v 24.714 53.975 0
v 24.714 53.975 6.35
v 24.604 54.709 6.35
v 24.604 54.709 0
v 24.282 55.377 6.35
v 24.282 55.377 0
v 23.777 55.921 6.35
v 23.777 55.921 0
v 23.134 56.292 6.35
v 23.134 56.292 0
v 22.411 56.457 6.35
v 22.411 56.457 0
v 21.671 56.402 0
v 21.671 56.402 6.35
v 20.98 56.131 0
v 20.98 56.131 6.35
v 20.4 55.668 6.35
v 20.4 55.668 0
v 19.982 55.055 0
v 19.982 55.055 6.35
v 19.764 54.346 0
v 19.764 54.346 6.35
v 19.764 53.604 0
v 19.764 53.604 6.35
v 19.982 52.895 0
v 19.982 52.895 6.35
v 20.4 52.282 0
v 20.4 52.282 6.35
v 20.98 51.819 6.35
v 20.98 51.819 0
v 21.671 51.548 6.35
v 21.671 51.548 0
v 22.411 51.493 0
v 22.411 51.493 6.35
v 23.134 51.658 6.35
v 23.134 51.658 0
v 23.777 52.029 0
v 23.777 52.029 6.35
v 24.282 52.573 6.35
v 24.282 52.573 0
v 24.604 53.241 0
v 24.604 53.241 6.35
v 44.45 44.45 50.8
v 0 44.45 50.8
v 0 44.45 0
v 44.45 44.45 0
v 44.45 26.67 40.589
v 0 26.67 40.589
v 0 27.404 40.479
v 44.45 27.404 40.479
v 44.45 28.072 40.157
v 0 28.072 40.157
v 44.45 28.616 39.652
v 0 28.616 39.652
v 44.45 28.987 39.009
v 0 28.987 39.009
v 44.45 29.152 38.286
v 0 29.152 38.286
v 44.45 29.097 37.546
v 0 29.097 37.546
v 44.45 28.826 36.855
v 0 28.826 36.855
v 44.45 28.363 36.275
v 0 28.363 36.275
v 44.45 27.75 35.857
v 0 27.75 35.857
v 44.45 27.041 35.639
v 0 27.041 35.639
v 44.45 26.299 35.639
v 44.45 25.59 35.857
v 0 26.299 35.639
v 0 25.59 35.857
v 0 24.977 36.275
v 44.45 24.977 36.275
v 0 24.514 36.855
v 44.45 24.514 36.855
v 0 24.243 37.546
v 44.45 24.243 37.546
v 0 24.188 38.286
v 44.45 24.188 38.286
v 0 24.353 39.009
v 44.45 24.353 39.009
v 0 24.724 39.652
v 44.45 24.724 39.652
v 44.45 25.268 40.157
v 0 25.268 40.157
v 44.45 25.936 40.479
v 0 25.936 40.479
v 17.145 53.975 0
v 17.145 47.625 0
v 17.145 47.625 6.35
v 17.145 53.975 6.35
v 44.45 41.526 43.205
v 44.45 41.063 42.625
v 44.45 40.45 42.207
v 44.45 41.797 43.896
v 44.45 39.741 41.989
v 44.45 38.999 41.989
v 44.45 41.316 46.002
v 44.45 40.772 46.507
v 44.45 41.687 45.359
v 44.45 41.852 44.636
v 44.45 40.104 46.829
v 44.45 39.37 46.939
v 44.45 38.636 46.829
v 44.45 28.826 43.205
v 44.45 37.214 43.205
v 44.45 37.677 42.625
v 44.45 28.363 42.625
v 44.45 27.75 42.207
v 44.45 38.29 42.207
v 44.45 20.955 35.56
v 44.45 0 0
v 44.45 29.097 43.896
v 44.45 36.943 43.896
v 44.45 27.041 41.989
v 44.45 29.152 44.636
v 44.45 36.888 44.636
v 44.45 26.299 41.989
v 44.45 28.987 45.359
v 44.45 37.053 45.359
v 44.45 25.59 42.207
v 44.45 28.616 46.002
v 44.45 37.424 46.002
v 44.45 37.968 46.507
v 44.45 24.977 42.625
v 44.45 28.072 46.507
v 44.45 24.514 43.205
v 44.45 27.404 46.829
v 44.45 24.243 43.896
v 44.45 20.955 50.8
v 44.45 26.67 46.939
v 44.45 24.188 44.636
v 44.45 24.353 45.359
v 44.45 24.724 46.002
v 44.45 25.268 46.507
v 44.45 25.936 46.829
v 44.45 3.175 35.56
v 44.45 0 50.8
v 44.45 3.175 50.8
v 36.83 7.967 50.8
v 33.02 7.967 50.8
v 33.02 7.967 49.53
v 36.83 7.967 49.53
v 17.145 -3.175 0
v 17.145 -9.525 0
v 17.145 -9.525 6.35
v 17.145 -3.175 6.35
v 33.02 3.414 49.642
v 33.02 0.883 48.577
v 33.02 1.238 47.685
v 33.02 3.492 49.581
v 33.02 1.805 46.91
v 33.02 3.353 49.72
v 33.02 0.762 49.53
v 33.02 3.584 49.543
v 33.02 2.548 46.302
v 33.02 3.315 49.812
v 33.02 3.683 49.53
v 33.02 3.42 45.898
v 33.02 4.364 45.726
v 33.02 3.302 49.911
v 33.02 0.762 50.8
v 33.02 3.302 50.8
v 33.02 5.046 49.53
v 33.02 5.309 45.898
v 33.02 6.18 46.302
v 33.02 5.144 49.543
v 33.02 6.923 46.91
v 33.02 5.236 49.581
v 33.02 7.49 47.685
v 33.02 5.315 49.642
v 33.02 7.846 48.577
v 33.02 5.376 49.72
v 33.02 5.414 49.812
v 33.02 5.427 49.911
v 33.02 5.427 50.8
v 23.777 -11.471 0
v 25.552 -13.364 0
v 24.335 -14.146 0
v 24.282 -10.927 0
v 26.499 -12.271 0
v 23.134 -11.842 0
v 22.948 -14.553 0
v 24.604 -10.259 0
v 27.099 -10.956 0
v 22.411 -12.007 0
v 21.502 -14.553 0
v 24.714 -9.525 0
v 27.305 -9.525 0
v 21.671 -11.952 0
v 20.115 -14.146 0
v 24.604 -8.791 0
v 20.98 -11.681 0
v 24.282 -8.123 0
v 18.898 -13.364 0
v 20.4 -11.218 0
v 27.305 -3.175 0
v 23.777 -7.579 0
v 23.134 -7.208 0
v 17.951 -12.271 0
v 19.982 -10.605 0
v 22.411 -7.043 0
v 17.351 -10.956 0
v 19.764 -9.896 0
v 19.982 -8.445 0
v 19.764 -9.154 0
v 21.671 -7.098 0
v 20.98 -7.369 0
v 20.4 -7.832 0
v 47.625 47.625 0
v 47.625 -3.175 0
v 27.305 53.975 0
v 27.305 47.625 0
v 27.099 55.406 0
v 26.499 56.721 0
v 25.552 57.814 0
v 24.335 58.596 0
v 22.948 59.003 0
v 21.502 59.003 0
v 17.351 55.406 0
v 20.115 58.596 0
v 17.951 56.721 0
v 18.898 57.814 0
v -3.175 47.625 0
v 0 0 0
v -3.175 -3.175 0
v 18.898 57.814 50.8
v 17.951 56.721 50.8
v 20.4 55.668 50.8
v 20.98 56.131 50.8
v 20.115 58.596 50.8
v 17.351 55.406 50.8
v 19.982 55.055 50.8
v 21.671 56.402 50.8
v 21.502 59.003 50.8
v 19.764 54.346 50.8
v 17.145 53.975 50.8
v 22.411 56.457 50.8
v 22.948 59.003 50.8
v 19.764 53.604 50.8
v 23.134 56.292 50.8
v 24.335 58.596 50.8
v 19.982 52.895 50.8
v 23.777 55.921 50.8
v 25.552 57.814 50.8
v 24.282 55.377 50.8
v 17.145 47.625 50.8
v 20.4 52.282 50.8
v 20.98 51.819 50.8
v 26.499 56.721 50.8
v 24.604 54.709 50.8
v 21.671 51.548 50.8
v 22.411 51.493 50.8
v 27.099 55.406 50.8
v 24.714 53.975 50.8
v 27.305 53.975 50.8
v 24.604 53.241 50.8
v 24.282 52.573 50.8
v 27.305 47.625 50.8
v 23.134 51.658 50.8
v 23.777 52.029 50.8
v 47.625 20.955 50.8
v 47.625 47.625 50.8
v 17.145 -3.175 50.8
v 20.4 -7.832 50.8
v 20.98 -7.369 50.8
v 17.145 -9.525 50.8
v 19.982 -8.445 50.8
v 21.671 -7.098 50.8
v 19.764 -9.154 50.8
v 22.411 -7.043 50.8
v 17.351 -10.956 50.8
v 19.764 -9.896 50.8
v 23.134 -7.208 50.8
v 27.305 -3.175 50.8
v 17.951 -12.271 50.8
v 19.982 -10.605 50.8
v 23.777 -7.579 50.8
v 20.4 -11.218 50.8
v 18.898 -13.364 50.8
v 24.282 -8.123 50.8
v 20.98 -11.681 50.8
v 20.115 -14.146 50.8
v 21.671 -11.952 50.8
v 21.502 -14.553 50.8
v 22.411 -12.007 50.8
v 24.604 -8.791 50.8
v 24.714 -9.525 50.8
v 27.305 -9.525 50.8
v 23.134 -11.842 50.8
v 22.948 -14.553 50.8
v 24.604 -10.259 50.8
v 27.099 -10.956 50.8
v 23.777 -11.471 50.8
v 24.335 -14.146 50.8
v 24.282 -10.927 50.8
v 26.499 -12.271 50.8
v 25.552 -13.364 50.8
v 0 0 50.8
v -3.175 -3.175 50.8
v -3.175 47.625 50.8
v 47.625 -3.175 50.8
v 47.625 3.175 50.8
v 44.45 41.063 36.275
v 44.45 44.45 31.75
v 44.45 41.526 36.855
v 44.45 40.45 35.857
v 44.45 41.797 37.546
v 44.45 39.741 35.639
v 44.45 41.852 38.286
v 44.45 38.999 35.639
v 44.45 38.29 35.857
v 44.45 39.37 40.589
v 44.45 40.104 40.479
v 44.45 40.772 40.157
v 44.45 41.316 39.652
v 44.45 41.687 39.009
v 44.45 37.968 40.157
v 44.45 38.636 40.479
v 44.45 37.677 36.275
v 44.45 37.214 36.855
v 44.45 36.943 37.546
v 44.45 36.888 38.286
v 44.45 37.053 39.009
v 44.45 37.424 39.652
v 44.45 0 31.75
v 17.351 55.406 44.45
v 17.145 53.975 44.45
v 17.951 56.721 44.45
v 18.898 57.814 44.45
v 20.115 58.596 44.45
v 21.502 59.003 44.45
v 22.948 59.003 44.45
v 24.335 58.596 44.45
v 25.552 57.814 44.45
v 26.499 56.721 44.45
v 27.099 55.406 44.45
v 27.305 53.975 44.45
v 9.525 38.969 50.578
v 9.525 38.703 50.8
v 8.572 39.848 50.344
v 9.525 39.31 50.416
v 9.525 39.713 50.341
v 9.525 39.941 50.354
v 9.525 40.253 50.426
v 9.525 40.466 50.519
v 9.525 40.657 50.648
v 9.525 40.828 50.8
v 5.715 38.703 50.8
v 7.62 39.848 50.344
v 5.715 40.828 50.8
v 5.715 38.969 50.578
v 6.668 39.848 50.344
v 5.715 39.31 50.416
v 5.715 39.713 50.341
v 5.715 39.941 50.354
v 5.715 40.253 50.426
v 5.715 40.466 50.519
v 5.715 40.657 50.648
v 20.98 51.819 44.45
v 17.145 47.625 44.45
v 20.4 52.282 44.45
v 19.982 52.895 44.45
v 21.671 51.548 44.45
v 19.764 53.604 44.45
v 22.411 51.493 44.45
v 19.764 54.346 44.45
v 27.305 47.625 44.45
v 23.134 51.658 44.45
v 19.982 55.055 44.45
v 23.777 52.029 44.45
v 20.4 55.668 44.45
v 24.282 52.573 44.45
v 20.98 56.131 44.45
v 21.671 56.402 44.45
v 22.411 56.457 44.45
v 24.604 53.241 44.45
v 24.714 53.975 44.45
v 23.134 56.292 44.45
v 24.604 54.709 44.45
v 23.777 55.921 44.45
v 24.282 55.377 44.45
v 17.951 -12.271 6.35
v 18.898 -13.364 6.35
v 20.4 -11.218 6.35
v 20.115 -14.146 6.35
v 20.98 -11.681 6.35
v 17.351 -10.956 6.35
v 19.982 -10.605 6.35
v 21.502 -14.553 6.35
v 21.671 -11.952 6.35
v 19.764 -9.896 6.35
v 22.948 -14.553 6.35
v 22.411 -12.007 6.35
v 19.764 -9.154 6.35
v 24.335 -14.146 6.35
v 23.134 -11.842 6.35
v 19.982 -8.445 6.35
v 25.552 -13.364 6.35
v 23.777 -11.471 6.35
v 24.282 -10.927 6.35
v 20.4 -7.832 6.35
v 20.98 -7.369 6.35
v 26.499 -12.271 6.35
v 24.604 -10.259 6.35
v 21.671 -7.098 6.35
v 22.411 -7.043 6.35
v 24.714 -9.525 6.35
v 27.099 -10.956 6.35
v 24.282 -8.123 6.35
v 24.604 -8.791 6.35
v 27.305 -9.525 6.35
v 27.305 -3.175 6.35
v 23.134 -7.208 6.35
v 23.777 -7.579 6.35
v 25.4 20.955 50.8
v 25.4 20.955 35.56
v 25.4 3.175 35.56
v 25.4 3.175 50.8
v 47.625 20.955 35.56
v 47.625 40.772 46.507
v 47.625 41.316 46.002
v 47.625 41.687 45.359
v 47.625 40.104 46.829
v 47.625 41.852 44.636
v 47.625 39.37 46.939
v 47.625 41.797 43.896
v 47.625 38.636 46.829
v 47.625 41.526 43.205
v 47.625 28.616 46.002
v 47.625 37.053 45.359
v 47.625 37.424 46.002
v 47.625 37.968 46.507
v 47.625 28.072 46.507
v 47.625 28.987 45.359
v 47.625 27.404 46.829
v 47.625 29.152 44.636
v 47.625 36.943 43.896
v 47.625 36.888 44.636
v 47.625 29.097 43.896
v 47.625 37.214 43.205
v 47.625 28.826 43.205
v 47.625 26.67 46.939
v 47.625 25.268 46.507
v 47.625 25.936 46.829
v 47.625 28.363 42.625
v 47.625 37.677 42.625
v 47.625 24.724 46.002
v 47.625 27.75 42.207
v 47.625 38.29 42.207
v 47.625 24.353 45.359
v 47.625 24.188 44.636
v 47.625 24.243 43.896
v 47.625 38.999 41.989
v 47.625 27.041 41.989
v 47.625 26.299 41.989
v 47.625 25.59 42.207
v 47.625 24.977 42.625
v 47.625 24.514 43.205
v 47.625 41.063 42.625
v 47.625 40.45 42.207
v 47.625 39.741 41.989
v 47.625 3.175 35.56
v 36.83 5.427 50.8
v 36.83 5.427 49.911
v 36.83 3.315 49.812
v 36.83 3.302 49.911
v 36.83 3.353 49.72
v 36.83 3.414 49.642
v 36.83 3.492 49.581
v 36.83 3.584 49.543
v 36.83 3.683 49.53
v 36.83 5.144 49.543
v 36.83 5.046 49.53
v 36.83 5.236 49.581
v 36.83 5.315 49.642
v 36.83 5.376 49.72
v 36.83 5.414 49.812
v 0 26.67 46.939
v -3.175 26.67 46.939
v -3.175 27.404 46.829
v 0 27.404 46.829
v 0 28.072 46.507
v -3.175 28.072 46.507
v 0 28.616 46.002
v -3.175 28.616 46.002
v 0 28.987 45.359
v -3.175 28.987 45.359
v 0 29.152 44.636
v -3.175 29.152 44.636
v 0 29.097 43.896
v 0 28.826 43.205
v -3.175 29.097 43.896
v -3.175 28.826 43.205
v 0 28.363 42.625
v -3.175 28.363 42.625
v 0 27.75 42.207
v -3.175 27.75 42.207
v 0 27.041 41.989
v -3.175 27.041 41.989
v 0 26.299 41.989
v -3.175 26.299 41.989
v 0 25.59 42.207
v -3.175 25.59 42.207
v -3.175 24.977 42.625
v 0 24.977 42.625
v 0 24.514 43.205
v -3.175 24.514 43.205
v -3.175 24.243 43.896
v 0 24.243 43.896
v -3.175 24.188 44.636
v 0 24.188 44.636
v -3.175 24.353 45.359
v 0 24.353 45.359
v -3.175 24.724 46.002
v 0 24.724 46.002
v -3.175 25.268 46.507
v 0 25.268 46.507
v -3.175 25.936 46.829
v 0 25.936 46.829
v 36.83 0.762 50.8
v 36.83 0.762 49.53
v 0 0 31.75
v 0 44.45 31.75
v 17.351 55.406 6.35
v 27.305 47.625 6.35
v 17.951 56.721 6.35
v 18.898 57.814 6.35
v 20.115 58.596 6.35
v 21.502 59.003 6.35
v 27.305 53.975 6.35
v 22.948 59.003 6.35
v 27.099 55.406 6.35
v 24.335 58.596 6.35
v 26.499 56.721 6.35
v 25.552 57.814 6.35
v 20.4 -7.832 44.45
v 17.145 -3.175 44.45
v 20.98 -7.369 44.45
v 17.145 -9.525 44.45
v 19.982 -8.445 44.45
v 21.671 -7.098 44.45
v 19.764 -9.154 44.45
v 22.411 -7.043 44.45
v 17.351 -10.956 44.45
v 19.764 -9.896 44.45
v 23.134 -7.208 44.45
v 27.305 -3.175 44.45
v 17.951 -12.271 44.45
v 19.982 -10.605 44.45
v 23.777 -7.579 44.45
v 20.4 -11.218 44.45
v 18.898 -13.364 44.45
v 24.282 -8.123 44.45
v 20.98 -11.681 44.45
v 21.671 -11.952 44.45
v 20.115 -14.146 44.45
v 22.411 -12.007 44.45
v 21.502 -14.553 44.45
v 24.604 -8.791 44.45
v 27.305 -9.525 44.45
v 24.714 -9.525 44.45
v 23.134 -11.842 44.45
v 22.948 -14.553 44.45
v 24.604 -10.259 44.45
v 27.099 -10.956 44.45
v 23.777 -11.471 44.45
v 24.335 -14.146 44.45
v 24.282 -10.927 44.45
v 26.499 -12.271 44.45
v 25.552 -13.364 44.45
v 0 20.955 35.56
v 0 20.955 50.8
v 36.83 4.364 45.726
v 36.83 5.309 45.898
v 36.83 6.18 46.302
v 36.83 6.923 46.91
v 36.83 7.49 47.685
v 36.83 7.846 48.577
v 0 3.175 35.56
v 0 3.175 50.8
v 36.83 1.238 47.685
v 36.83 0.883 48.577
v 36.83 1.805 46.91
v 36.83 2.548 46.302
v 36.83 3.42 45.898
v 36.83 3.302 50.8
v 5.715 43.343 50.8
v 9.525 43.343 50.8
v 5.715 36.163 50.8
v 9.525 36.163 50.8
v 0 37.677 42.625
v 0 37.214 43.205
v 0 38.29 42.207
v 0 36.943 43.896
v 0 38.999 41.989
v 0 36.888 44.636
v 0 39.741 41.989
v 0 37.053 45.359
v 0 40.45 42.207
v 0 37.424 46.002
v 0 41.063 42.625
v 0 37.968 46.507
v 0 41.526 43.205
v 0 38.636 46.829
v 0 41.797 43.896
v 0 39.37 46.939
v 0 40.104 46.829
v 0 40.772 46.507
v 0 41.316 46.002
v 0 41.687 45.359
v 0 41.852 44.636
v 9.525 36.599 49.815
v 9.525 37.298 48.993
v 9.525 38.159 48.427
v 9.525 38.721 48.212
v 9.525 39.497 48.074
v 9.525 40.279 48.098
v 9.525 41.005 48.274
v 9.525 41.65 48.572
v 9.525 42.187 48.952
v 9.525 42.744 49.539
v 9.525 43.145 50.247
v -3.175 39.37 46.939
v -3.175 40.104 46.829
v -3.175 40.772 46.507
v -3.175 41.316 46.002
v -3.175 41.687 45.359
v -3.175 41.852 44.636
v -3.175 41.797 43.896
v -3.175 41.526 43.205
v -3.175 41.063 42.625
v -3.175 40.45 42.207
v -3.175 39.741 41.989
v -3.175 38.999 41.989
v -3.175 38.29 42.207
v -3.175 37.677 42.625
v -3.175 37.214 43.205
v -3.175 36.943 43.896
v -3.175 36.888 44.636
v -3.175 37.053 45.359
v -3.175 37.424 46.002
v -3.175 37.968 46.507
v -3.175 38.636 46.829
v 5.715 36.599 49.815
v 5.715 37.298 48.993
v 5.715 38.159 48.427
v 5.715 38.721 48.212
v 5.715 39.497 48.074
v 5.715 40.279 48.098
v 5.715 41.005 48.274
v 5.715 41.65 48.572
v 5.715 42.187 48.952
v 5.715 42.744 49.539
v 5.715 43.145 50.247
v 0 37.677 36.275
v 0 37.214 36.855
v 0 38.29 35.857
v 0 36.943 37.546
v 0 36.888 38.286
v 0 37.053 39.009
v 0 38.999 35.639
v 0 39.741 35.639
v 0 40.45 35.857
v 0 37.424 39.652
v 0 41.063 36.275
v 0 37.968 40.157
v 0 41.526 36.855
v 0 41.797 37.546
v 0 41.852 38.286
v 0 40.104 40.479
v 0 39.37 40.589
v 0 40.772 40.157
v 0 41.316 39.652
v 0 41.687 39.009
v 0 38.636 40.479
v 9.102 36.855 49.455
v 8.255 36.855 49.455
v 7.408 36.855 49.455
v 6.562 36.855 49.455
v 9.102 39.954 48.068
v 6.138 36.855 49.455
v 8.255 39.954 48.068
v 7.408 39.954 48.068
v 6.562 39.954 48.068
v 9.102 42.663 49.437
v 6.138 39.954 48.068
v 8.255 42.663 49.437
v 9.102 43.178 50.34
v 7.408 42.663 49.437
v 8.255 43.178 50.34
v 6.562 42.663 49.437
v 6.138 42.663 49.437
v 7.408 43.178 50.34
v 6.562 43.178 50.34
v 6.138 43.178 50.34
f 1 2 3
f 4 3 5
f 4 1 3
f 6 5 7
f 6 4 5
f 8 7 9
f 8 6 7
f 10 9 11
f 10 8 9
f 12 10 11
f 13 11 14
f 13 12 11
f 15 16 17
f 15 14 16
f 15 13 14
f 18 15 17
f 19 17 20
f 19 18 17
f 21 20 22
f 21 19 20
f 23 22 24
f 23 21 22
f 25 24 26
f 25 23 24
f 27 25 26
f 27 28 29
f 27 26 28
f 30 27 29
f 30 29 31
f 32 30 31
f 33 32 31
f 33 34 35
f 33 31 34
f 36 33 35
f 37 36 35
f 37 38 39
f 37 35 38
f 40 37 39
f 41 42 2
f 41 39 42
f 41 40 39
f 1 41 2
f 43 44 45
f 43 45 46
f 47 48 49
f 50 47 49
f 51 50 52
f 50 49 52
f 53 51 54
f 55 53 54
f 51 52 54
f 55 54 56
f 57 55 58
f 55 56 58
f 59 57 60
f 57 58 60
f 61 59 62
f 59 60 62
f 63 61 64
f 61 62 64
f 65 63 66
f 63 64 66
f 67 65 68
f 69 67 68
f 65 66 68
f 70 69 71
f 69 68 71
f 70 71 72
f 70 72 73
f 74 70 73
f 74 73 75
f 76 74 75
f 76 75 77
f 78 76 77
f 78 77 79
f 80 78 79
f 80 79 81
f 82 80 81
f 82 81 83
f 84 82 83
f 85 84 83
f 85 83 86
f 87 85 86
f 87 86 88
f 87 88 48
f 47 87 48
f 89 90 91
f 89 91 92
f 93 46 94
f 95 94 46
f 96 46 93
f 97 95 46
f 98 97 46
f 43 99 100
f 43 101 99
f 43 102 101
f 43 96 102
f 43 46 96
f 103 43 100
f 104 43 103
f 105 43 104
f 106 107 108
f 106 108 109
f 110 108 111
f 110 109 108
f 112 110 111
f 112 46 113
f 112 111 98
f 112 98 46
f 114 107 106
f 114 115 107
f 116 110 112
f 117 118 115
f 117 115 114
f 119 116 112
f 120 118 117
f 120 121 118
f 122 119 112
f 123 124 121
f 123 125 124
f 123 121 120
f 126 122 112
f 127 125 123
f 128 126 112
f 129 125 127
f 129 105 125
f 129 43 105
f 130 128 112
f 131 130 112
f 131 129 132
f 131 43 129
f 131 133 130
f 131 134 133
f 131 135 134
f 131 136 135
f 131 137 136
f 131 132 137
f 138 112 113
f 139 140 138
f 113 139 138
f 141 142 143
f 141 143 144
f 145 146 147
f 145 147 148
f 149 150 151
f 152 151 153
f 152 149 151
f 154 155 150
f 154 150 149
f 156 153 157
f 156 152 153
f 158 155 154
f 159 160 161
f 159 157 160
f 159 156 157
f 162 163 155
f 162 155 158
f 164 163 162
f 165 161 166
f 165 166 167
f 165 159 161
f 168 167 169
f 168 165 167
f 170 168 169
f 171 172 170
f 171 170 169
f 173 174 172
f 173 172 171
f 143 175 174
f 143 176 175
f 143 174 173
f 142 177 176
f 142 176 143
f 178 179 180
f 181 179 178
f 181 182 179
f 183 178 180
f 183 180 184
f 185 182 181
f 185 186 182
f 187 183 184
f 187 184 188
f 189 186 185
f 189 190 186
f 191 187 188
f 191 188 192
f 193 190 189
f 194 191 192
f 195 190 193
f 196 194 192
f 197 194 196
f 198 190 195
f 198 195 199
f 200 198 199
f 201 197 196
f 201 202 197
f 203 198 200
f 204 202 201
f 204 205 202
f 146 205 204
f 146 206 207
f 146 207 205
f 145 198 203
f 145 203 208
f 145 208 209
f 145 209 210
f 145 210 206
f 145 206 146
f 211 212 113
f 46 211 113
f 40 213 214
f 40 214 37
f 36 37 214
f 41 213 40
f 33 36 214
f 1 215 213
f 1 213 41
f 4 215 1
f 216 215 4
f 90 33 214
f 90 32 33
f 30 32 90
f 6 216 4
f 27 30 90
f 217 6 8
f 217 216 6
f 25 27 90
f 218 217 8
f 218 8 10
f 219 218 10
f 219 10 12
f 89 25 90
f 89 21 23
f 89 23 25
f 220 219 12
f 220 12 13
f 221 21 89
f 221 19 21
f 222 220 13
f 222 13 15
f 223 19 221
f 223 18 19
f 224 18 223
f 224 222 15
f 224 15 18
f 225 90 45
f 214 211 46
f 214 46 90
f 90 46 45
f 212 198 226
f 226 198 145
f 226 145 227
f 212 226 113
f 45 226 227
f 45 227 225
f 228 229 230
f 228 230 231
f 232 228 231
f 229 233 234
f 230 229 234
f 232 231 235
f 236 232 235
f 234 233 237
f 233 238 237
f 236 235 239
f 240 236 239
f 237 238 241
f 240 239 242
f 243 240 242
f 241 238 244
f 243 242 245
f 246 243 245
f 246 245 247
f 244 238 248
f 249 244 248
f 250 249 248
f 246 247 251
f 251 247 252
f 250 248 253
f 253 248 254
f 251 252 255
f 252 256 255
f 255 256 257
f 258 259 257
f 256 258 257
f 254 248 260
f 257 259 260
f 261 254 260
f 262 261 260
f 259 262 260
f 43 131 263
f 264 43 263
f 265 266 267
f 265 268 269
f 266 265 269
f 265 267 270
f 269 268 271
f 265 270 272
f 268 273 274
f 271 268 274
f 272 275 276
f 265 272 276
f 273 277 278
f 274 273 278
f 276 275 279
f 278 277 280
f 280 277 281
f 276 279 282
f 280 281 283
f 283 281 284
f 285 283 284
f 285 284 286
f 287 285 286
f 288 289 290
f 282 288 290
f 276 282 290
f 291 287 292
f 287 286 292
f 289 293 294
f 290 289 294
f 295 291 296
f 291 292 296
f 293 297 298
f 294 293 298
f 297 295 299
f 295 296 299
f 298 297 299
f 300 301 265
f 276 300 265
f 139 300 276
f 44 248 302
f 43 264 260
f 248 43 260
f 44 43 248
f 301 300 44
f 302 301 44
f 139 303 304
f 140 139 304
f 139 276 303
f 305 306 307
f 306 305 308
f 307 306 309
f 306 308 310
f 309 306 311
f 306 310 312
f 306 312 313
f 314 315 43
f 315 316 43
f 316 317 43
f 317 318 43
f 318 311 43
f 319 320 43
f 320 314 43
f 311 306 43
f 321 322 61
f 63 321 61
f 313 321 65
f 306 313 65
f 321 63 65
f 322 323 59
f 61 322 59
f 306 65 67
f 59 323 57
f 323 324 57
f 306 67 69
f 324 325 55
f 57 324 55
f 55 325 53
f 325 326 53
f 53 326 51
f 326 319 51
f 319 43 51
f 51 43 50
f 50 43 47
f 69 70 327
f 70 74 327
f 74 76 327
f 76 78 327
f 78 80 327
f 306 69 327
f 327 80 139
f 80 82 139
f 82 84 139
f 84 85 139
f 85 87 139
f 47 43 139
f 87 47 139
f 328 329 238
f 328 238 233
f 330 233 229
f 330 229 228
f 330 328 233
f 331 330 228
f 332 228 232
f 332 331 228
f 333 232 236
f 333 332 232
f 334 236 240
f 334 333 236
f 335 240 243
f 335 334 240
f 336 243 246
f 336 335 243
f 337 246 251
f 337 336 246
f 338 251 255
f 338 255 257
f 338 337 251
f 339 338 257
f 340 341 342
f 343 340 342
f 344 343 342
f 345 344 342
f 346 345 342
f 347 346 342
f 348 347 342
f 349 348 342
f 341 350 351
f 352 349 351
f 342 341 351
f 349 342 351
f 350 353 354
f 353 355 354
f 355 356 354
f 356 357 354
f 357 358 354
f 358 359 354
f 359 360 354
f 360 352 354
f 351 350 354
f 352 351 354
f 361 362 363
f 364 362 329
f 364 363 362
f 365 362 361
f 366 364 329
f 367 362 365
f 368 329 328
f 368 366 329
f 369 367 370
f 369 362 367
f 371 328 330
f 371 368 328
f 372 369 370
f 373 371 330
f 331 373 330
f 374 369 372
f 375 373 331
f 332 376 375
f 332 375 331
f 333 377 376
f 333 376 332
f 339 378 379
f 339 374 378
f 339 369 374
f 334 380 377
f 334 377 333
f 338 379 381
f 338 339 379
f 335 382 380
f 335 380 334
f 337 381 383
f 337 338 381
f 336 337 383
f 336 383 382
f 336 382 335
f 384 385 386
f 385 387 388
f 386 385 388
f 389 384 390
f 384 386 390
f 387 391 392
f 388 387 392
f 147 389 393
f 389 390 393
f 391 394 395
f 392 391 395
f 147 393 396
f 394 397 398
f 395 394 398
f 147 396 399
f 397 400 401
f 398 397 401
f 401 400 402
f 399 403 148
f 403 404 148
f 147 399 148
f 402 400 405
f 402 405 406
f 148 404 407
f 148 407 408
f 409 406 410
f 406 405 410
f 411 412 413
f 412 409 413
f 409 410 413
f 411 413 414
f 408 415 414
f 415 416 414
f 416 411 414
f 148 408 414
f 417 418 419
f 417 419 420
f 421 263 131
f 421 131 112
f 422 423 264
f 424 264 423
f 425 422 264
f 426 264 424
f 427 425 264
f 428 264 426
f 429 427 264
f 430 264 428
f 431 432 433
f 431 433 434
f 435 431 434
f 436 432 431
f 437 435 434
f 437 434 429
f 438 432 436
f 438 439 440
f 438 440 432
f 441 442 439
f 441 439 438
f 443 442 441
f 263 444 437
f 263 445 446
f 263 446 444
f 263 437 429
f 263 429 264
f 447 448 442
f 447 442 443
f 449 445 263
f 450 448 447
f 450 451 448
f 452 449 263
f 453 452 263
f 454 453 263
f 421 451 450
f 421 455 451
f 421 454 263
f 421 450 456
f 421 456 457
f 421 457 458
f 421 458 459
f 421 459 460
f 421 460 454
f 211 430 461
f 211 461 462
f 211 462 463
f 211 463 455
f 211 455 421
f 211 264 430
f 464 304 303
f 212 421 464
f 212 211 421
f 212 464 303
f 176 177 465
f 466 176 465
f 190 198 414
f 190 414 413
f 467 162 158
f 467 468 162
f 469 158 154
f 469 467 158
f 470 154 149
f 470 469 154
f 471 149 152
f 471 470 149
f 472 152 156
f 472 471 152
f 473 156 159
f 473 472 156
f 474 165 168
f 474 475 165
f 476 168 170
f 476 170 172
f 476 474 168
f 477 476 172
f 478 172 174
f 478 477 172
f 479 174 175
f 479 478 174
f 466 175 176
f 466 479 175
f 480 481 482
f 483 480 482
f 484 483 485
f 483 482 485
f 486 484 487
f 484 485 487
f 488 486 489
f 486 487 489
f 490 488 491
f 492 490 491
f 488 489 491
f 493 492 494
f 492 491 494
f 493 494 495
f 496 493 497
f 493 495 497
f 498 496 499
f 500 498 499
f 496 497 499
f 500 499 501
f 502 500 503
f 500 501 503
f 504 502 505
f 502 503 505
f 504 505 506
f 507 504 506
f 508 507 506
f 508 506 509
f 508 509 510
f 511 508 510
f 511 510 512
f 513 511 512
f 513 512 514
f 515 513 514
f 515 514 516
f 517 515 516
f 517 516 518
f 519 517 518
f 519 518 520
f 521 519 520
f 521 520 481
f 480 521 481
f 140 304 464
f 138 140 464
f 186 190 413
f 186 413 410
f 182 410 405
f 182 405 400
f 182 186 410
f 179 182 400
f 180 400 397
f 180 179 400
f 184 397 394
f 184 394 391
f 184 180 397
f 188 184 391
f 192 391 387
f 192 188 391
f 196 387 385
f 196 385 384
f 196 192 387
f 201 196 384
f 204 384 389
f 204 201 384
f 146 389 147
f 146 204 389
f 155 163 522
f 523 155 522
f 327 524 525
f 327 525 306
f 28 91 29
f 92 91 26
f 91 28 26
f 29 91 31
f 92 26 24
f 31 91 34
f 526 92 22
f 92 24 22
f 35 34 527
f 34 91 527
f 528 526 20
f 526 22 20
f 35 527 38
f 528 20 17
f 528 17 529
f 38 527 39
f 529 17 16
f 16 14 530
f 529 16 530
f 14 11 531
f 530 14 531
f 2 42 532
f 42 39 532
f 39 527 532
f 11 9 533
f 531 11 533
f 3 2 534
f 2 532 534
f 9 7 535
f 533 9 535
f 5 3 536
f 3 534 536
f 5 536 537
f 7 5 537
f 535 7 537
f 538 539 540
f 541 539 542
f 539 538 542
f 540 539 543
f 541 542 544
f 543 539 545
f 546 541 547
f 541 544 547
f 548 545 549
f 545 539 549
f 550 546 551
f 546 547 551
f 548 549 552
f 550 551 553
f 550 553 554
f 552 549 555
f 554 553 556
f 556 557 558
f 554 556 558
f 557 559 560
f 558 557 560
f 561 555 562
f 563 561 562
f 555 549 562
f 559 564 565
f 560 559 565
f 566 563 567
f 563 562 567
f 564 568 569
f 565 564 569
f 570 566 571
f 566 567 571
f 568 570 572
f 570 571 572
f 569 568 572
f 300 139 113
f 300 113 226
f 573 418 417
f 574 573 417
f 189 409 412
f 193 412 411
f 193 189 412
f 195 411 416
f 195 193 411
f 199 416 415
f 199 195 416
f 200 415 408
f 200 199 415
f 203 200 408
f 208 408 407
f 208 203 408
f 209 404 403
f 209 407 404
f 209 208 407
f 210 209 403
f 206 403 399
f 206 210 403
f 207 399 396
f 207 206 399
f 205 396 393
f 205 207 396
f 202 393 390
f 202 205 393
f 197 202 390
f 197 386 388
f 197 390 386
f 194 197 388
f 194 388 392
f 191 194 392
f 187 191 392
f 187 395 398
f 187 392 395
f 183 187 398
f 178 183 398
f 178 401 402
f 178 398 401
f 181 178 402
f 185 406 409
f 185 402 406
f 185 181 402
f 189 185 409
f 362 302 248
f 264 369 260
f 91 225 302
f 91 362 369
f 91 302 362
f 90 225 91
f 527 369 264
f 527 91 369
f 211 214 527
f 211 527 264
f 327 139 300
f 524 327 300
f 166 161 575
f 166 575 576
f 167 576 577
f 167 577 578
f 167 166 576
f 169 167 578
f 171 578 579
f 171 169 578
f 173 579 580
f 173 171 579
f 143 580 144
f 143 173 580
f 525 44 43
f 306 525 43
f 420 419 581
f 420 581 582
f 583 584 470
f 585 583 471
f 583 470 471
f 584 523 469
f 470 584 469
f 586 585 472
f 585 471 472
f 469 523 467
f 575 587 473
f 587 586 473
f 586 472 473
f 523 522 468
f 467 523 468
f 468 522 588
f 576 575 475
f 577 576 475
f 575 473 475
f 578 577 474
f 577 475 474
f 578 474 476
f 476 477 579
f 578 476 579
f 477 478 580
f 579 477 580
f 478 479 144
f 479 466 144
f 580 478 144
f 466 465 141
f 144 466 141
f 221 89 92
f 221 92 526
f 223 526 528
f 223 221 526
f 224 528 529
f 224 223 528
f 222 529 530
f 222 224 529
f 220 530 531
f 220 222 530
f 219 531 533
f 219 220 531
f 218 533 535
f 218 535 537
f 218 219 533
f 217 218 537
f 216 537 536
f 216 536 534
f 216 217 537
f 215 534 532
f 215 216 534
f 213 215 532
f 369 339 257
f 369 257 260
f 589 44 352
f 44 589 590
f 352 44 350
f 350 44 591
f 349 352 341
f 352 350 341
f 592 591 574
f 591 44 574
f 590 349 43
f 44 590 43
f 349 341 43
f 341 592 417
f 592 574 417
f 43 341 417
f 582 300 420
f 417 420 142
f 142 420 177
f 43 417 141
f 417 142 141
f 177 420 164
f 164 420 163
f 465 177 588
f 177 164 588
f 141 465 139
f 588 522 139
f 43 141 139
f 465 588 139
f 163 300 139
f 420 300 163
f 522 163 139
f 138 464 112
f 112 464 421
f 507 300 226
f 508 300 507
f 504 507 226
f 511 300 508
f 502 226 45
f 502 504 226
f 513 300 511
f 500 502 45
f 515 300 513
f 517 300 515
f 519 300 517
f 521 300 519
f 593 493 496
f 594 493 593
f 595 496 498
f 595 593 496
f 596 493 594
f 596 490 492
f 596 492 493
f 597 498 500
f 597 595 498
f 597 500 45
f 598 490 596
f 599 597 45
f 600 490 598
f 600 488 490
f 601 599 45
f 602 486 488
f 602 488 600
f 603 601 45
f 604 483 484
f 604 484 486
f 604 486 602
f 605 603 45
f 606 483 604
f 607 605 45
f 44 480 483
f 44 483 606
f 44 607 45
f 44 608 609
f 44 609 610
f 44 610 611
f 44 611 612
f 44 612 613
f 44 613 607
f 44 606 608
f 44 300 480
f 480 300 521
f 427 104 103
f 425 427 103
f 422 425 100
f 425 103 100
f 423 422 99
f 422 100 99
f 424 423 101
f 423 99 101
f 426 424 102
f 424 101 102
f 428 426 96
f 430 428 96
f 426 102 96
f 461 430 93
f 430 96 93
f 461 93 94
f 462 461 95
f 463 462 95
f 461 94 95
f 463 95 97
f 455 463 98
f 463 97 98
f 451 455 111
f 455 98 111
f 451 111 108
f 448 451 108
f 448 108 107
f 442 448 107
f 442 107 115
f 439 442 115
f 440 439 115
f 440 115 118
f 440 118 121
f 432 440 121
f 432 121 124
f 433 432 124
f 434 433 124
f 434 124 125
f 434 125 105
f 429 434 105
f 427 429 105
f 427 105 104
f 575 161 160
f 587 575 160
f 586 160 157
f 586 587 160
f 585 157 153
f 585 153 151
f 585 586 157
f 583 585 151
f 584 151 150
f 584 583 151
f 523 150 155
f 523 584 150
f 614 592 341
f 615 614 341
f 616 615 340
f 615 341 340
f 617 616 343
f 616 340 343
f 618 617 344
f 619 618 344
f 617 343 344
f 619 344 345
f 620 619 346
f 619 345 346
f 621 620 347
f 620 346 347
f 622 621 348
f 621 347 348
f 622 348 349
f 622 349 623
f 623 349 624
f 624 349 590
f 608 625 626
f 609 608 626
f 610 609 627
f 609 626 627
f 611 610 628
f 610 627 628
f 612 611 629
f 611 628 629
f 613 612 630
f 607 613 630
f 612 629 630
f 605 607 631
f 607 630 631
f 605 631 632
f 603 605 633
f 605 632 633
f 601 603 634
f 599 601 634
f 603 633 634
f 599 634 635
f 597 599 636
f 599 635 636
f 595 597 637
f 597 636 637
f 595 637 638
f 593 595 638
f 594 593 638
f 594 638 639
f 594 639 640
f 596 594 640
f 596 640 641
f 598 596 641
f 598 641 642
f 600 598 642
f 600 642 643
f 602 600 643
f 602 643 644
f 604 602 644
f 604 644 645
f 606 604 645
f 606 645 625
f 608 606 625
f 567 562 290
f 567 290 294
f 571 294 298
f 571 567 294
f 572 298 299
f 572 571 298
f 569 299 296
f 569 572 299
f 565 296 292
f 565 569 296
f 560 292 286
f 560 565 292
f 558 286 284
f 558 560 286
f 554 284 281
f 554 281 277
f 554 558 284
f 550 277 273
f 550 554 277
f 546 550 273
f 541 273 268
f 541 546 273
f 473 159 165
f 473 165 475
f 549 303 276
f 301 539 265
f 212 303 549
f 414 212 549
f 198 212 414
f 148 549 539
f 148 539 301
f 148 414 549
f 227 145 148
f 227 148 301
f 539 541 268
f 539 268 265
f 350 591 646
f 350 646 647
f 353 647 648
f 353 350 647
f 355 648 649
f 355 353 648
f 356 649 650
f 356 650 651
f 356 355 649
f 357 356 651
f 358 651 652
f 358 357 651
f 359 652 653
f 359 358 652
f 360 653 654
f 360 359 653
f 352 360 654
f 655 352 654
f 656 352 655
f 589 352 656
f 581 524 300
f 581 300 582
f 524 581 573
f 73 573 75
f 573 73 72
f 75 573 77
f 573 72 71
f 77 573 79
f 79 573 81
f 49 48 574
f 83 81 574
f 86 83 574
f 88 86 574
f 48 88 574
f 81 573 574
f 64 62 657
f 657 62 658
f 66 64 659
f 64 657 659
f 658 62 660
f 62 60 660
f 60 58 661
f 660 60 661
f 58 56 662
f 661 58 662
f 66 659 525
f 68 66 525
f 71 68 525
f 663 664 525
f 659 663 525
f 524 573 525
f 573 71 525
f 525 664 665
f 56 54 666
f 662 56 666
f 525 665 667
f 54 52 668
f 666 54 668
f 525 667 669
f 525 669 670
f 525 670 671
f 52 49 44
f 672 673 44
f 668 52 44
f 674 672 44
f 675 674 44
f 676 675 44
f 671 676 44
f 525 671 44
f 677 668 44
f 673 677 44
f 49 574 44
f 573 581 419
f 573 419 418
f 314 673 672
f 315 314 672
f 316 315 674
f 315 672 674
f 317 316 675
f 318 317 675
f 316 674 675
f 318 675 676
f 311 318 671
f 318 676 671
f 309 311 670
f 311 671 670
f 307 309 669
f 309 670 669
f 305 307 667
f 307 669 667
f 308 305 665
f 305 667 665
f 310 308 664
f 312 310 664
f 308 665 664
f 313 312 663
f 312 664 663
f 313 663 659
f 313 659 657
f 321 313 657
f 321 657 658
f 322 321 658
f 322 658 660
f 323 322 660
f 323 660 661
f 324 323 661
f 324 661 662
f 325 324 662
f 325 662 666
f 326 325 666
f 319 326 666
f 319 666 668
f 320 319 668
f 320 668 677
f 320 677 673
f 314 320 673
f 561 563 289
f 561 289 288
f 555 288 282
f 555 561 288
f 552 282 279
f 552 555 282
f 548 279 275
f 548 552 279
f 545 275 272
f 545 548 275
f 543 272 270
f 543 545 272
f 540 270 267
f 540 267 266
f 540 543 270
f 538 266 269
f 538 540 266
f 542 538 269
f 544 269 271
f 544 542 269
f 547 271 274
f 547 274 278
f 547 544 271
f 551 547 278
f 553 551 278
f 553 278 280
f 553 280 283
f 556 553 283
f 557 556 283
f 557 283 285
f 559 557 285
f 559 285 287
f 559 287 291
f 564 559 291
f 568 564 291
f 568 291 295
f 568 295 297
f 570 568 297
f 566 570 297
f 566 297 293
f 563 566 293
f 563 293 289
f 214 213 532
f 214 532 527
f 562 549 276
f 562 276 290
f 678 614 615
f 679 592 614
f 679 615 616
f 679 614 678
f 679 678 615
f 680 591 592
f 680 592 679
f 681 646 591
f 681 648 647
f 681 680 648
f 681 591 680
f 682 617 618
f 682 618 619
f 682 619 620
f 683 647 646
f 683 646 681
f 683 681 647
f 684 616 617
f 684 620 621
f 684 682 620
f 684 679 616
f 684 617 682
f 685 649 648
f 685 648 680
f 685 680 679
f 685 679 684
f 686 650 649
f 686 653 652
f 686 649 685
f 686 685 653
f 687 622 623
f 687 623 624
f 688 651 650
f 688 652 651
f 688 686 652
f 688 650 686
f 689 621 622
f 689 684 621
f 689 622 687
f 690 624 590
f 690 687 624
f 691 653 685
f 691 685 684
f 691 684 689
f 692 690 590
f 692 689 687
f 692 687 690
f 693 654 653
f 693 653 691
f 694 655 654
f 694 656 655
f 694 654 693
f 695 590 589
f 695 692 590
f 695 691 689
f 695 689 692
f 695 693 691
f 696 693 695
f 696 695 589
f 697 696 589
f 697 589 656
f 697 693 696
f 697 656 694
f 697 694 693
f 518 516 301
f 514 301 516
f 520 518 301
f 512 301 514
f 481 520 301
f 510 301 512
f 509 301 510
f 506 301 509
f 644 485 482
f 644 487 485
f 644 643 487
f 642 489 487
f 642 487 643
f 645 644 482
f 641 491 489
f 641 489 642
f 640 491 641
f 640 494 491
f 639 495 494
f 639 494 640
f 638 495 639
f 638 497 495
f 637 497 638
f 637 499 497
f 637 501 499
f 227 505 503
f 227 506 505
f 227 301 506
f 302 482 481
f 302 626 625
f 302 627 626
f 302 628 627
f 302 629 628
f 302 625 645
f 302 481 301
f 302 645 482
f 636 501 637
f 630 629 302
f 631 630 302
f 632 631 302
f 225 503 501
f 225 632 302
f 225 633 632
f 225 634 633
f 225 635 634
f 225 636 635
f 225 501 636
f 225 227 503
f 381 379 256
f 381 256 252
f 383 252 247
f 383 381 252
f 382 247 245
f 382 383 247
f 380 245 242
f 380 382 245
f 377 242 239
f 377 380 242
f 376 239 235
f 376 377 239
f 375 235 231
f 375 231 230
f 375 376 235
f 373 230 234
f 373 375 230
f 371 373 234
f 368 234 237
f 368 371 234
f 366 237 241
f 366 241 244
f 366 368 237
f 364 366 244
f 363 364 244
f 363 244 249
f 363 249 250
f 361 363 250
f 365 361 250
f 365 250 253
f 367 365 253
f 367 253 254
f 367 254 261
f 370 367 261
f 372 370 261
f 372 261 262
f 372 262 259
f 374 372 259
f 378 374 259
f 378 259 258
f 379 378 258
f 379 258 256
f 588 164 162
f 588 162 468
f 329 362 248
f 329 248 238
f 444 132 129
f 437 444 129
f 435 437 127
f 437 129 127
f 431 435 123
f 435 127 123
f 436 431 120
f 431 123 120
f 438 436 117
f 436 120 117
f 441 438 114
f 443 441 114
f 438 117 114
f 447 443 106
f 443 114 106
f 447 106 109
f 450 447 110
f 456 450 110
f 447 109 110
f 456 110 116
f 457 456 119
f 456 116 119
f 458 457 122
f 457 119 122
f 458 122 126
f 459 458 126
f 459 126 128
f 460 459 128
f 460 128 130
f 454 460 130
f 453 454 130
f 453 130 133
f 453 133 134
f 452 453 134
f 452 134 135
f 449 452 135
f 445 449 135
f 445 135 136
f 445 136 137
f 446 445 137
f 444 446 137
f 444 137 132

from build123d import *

# Parameters (mm, degrees)
SKETCH1_R              = 2.4892
SKETCH1_W              = 44.45
SKETCH1_H              = 44.45
BOSS_EXTRUDE2_DEPTH    = 50.8
SKETCH13_W             = 44.45
SKETCH13_H             = 19.05
BOSS_EXTRUDE3_DEPTH    = 44.45
SPLIT1_SURFACE_1_BACK  = 103.894
SPLIT1_SURFACE_1_DEPTH = 207.788
SPLIT1_SURFACE_2_BACK  = 103.894
SPLIT1_SURFACE_2_DEPTH = 207.788
SKETCH17_R             = 2.4892
CUT_EXTRUDE5_DEPTH     = 93.998779696
SKETCH15_W             = 15.24
SKETCH15_H             = 17.78
CUT_EXTRUDE4_DEPTH     = 25.4
SKETCH22_W             = 38.1
SKETCH22_H             = 11.759714853
SKETCH22_H_2           = 6.35
SKETCH22_H_3           = 50.8
CUT_EXTRUDE7_DEPTH     = 84.649049158
SKETCH25_R             = 2.4892
CUT_EXTRUDE8_DEPTH     = 92.303196275
SKETCH27_W             = 15.24
SKETCH27_H             = 17.78
CUT_EXTRUDE10_DEPTH    = 25.4
CUT_SWEEP8_START       = 5.715
CUT_SWEEP8_DEPTH       = 3.81
SKETCH43_W             = 3.81
SKETCH43_H             = 2.54
CUT_EXTRUDE11_DEPTH    = 5.08
SKETCH44_W             = 3.81
SKETCH44_H             = 2.54
CUT_EXTRUDE12_DEPTH    = 5.08
SKETCH45_W             = 3.81
SKETCH45_H             = 3.81
CUT_EXTRUDE14_DEPTH    = 2.159
FILLET1_R              = 3.81
FILLET3_R              = 0.381


# Read off the part's stored shape, not the designer's step: Cut-Sweep8
with BuildPart() as part:
    # Sketch1 → Boss-Extrude2 (new body)
    with BuildSketch(Plane.XY):
        with BuildLine():
            Line((-3.175, -3.175), (-3.175, 47.625))
            Line((-3.175, 47.625), (17.145, 47.625))
            Line((17.145, 47.625), (17.145, 53.975))
            ThreePointArc((17.145, 53.975), (22.225, 59.055), (27.305, 53.975))
            Line((27.305, 53.975), (27.305, 47.625))
            Line((27.305, 47.625), (47.625, 47.625))
            Line((47.625, 47.625), (47.625, -3.175))
            Line((47.625, -3.175), (27.305, -3.175))
            Line((27.305, -3.175), (27.305, -9.525))
            ThreePointArc((27.305, -9.525), (22.225, -14.605), (17.145, -9.525))
            Line((17.145, -9.525), (17.145, -3.175))
            Line((17.145, -3.175), (-3.175, -3.175))
        make_face()
        with Locations((22.225, 53.975)):
            Circle(SKETCH1_R, mode=Mode.SUBTRACT)
        with Locations((22.225, -9.525)):
            Circle(SKETCH1_R, mode=Mode.SUBTRACT)
        with Locations((22.225, 22.225)):
            Rectangle(SKETCH1_W, SKETCH1_H, mode=Mode.SUBTRACT)
    extrude(amount=BOSS_EXTRUDE2_DEPTH)

    # Sketch13 → Boss-Extrude3 (add)
    with BuildSketch(Plane(origin=(0, 0, 0), x_dir=(1, 0, 0), z_dir=(0, 1, 0))):
        with Locations((22.225, -41.275)):
            Rectangle(SKETCH13_W, SKETCH13_H)
    extrude(amount=BOSS_EXTRUDE3_DEPTH)


with BuildPart() as body_2:
    # Split1: the piece behind the surface
    add(part.part)
    # Split1 surface: a surface, the sketch's curves swept straight by 207.788 mm
    with BuildLine(Plane(origin=(0, 0, 31.75), x_dir=(-1, 0, 0), z_dir=(0, 0, -1)).offset(-SPLIT1_SURFACE_1_BACK), mode=Mode.PRIVATE) as split1_surface_1_path:
        Line((-44.45, 0), (0, 0))
        Line((0, 0), (0, 44.45))
        Line((0, 44.45), (-44.45, 44.45))
        Line((-44.45, 44.45), (-44.45, 0))
    split1_surface_1 = Shell.extrude(split1_surface_1_path.wire(), (0 * SPLIT1_SURFACE_1_DEPTH, 0 * SPLIT1_SURFACE_1_DEPTH, -1 * SPLIT1_SURFACE_1_DEPTH))
    split(bisect_by=split1_surface_1, keep=Keep.BOTTOM)

    # Sketch17 → Cut-Extrude5 (cut, through all)
    with BuildSketch(Plane.ZY.offset(3.175)):
        with Locations((44.45, 39.37)):
            Circle(SKETCH17_R)
        with Locations((44.45, 26.67)):
            Circle(SKETCH17_R)
    extrude(amount=-CUT_EXTRUDE5_DEPTH, mode=Mode.SUBTRACT)

    # Sketch15 → Cut-Extrude4 (cut)
    with BuildSketch(Plane(origin=(47.625, 0, 0), x_dir=(0, 0, -1), z_dir=(1, 0, 0))):
        with Locations((-43.18, 12.065)):
            Rectangle(SKETCH15_W, SKETCH15_H)
    extrude(amount=-CUT_EXTRUDE4_DEPTH, mode=Mode.SUBTRACT)

    # Sketch22 → Cut-Extrude7 (cut, through all)
    with BuildSketch(Plane(origin=(27.305, 0, 0), x_dir=(0, 0, -1), z_dir=(1, 0, 0))):
        with Locations((-25.4, -15.404857427)):
            Rectangle(SKETCH22_W, SKETCH22_H)
        with Locations((-25.4, -6.35)):
            Rectangle(SKETCH22_W, SKETCH22_H_2)
        with Locations((-25.4, 73.025)):
            Rectangle(SKETCH22_W, SKETCH22_H_3)
    extrude(amount=-CUT_EXTRUDE7_DEPTH, mode=Mode.SUBTRACT)


with BuildPart() as part_1:
    add(part.part)

    # Split1: split by a surface, the side it looks to stays
    # Split1 surface: a surface, the sketch's curves swept straight by 207.788 mm
    with BuildLine(Plane(origin=(0, 0, 31.75), x_dir=(-1, 0, 0), z_dir=(0, 0, -1)).offset(-SPLIT1_SURFACE_2_BACK), mode=Mode.PRIVATE) as split1_surface_2_path:
        Line((-44.45, 0), (0, 0))
        Line((0, 0), (0, 44.45))
        Line((0, 44.45), (-44.45, 44.45))
        Line((-44.45, 44.45), (-44.45, 0))
    split1_surface_2 = Shell.extrude(split1_surface_2_path.wire(), (0 * SPLIT1_SURFACE_2_DEPTH, 0 * SPLIT1_SURFACE_2_DEPTH, -1 * SPLIT1_SURFACE_2_DEPTH))
    split(bisect_by=split1_surface_2, keep=Keep.TOP)

    # Sketch25 → Cut-Extrude8 (cut, through all)
    with BuildSketch(Plane.ZY):
        with Locations((38.1, 39.37)):
            Circle(SKETCH25_R)
        with Locations((38.1, 26.67)):
            Circle(SKETCH25_R)
    extrude(amount=-CUT_EXTRUDE8_DEPTH, mode=Mode.SUBTRACT)

    # Sketch27 → Cut-Extrude10 (cut)
    with BuildSketch(Plane.ZY):
        with Locations((43.18, 12.065)):
            Rectangle(SKETCH27_W, SKETCH27_H)
    extrude(amount=-CUT_EXTRUDE10_DEPTH, mode=Mode.SUBTRACT)

    # Cut-Sweep8 outline → Cut-Sweep8 (cut)
    with BuildSketch(Plane.YZ.offset(CUT_SWEEP8_START)):
        with BuildLine():
            Line((38.703239312, 50.8), (36.163239312, 50.8))
            add(Edge.make_bspline(
                [(36.163239312, 50.8), (36.225534408, 50.597164917), (36.312483324, 50.346196771), (36.540975299, 49.893847377), (36.681949945, 49.671273895), (37.201643145, 49.02320701), (37.65947496, 48.657171163), (38.760225903, 48.147893995), (39.359139113, 48.040295964), (40.549690891, 48.09558808), (41.091576359, 48.267260343), (42.021692589, 48.771522476), (42.377673695, 49.091912743), (42.806183968, 49.610084567), (42.922064983, 49.785337738), (43.088653257, 50.094359328), (43.138582777, 50.224558866), (43.229332741, 50.487949571), (43.285126469, 50.642531241), (43.343215184, 50.800000001)],
                knots=[0.125824735, 0.125824735, 0.125824735, 0.125824735, 0.180460689, 0.180460689, 0.235096643, 0.235096643, 0.344368551, 0.344368551, 0.453640459, 0.453640459, 0.562912367, 0.562912367, 0.672184276, 0.672184276, 0.72682023, 0.72682023, 0.781456184, 0.781456184, 0.851866862, 0.851866862, 0.851866862, 0.851866862], degree=3))
            Line((43.343215184, 50.800000001), (40.827981558, 50.8))
            add(Edge.make_bspline(
                [(38.703239312, 50.8), (38.826689757, 50.673392723), (38.993190634, 50.54038206), (39.381954846, 50.381636812), (39.621785637, 50.324791943), (40.074002601, 50.362753286), (40.322910855, 50.426905702), (40.626904824, 50.618065), (40.735717985, 50.704946478), (40.827981558, 50.8)],
                knots=[0.125824735, 0.125824735, 0.125824735, 0.125824735, 0.235096643, 0.235096643, 0.344368551, 0.344368551, 0.453640459, 0.453640459, 0.519851531, 0.519851531, 0.519851531, 0.519851531], degree=3))
        make_face()
    extrude(amount=CUT_SWEEP8_DEPTH, mode=Mode.SUBTRACT)

    # Sketch43 → Cut-Extrude11 (cut)
    with BuildSketch(Plane.XY.offset(50.8)):
        with Locations((34.925, 2.032)):
            Rectangle(SKETCH43_W, SKETCH43_H)
    extrude(amount=-CUT_EXTRUDE11_DEPTH, mode=Mode.SUBTRACT)

    # Sketch44 → Cut-Extrude12 (cut)
    with BuildSketch(Plane.XY.offset(50.8)):
        with Locations((34.925, 6.696742258)):
            Rectangle(SKETCH44_W, SKETCH44_H)
    extrude(amount=-CUT_EXTRUDE12_DEPTH, mode=Mode.SUBTRACT)

    # Sketch45 → Cut-Extrude14 (cut)
    with BuildSketch(Plane.XZ.offset(-3.302)):
        with Locations((34.925, 47.625)):
            Rectangle(SKETCH45_W, SKETCH45_H)
    extrude(amount=-CUT_EXTRUDE14_DEPTH, mode=Mode.SUBTRACT)

    # Fillet1
    # the kernel refuses this fillet: 3.81 mm, written as the material it adds along each edge
    with BuildSketch(Plane(origin=(33.02, 7.966742258, 45.72), x_dir=(0, 0, 1), z_dir=(1, 0, 0))) as fillet1_piece_1:
        with BuildLine():
            CenterArc((FILLET1_R, FILLET1_R), FILLET1_R, 180, 90)
            Line((0, FILLET1_R), (-FILLET1_R * 0.02, FILLET1_R))
            Line((-FILLET1_R * 0.02, FILLET1_R), (-FILLET1_R * 0.02, -FILLET1_R * 0.02))
            Line((-FILLET1_R * 0.02, -FILLET1_R * 0.02), (FILLET1_R, -FILLET1_R * 0.02))
            Line((FILLET1_R, -FILLET1_R * 0.02), (FILLET1_R, 0))
        make_face()
    extrude(amount=3.81)
    with BuildSketch(Plane(origin=(36.83, 0.762, 45.72), x_dir=(0, 1, 0), z_dir=(-1, 0, 0))) as fillet1_piece_2:
        with BuildLine():
            CenterArc((FILLET1_R, -FILLET1_R), FILLET1_R, 90, 90)
            Line((0, -FILLET1_R), (-FILLET1_R * 0.02, -FILLET1_R))
            Line((-FILLET1_R * 0.02, -FILLET1_R), (-FILLET1_R * 0.02, FILLET1_R * 0.02))
            Line((-FILLET1_R * 0.02, FILLET1_R * 0.02), (FILLET1_R, FILLET1_R * 0.02))
            Line((FILLET1_R, FILLET1_R * 0.02), (FILLET1_R, 0))
        make_face()
    extrude(amount=3.81)

    # Fillet3
    fillet3_edges = [part_1.edges().sort_by_distance(p)[0] for p in [
        (34.925, 5.426742258, 49.53),
        (34.925, 3.302, 49.53),
    ]]
    fillet(fillet3_edges, radius=FILLET3_R)


solid = Compound([body_2.part, part_1.part])
